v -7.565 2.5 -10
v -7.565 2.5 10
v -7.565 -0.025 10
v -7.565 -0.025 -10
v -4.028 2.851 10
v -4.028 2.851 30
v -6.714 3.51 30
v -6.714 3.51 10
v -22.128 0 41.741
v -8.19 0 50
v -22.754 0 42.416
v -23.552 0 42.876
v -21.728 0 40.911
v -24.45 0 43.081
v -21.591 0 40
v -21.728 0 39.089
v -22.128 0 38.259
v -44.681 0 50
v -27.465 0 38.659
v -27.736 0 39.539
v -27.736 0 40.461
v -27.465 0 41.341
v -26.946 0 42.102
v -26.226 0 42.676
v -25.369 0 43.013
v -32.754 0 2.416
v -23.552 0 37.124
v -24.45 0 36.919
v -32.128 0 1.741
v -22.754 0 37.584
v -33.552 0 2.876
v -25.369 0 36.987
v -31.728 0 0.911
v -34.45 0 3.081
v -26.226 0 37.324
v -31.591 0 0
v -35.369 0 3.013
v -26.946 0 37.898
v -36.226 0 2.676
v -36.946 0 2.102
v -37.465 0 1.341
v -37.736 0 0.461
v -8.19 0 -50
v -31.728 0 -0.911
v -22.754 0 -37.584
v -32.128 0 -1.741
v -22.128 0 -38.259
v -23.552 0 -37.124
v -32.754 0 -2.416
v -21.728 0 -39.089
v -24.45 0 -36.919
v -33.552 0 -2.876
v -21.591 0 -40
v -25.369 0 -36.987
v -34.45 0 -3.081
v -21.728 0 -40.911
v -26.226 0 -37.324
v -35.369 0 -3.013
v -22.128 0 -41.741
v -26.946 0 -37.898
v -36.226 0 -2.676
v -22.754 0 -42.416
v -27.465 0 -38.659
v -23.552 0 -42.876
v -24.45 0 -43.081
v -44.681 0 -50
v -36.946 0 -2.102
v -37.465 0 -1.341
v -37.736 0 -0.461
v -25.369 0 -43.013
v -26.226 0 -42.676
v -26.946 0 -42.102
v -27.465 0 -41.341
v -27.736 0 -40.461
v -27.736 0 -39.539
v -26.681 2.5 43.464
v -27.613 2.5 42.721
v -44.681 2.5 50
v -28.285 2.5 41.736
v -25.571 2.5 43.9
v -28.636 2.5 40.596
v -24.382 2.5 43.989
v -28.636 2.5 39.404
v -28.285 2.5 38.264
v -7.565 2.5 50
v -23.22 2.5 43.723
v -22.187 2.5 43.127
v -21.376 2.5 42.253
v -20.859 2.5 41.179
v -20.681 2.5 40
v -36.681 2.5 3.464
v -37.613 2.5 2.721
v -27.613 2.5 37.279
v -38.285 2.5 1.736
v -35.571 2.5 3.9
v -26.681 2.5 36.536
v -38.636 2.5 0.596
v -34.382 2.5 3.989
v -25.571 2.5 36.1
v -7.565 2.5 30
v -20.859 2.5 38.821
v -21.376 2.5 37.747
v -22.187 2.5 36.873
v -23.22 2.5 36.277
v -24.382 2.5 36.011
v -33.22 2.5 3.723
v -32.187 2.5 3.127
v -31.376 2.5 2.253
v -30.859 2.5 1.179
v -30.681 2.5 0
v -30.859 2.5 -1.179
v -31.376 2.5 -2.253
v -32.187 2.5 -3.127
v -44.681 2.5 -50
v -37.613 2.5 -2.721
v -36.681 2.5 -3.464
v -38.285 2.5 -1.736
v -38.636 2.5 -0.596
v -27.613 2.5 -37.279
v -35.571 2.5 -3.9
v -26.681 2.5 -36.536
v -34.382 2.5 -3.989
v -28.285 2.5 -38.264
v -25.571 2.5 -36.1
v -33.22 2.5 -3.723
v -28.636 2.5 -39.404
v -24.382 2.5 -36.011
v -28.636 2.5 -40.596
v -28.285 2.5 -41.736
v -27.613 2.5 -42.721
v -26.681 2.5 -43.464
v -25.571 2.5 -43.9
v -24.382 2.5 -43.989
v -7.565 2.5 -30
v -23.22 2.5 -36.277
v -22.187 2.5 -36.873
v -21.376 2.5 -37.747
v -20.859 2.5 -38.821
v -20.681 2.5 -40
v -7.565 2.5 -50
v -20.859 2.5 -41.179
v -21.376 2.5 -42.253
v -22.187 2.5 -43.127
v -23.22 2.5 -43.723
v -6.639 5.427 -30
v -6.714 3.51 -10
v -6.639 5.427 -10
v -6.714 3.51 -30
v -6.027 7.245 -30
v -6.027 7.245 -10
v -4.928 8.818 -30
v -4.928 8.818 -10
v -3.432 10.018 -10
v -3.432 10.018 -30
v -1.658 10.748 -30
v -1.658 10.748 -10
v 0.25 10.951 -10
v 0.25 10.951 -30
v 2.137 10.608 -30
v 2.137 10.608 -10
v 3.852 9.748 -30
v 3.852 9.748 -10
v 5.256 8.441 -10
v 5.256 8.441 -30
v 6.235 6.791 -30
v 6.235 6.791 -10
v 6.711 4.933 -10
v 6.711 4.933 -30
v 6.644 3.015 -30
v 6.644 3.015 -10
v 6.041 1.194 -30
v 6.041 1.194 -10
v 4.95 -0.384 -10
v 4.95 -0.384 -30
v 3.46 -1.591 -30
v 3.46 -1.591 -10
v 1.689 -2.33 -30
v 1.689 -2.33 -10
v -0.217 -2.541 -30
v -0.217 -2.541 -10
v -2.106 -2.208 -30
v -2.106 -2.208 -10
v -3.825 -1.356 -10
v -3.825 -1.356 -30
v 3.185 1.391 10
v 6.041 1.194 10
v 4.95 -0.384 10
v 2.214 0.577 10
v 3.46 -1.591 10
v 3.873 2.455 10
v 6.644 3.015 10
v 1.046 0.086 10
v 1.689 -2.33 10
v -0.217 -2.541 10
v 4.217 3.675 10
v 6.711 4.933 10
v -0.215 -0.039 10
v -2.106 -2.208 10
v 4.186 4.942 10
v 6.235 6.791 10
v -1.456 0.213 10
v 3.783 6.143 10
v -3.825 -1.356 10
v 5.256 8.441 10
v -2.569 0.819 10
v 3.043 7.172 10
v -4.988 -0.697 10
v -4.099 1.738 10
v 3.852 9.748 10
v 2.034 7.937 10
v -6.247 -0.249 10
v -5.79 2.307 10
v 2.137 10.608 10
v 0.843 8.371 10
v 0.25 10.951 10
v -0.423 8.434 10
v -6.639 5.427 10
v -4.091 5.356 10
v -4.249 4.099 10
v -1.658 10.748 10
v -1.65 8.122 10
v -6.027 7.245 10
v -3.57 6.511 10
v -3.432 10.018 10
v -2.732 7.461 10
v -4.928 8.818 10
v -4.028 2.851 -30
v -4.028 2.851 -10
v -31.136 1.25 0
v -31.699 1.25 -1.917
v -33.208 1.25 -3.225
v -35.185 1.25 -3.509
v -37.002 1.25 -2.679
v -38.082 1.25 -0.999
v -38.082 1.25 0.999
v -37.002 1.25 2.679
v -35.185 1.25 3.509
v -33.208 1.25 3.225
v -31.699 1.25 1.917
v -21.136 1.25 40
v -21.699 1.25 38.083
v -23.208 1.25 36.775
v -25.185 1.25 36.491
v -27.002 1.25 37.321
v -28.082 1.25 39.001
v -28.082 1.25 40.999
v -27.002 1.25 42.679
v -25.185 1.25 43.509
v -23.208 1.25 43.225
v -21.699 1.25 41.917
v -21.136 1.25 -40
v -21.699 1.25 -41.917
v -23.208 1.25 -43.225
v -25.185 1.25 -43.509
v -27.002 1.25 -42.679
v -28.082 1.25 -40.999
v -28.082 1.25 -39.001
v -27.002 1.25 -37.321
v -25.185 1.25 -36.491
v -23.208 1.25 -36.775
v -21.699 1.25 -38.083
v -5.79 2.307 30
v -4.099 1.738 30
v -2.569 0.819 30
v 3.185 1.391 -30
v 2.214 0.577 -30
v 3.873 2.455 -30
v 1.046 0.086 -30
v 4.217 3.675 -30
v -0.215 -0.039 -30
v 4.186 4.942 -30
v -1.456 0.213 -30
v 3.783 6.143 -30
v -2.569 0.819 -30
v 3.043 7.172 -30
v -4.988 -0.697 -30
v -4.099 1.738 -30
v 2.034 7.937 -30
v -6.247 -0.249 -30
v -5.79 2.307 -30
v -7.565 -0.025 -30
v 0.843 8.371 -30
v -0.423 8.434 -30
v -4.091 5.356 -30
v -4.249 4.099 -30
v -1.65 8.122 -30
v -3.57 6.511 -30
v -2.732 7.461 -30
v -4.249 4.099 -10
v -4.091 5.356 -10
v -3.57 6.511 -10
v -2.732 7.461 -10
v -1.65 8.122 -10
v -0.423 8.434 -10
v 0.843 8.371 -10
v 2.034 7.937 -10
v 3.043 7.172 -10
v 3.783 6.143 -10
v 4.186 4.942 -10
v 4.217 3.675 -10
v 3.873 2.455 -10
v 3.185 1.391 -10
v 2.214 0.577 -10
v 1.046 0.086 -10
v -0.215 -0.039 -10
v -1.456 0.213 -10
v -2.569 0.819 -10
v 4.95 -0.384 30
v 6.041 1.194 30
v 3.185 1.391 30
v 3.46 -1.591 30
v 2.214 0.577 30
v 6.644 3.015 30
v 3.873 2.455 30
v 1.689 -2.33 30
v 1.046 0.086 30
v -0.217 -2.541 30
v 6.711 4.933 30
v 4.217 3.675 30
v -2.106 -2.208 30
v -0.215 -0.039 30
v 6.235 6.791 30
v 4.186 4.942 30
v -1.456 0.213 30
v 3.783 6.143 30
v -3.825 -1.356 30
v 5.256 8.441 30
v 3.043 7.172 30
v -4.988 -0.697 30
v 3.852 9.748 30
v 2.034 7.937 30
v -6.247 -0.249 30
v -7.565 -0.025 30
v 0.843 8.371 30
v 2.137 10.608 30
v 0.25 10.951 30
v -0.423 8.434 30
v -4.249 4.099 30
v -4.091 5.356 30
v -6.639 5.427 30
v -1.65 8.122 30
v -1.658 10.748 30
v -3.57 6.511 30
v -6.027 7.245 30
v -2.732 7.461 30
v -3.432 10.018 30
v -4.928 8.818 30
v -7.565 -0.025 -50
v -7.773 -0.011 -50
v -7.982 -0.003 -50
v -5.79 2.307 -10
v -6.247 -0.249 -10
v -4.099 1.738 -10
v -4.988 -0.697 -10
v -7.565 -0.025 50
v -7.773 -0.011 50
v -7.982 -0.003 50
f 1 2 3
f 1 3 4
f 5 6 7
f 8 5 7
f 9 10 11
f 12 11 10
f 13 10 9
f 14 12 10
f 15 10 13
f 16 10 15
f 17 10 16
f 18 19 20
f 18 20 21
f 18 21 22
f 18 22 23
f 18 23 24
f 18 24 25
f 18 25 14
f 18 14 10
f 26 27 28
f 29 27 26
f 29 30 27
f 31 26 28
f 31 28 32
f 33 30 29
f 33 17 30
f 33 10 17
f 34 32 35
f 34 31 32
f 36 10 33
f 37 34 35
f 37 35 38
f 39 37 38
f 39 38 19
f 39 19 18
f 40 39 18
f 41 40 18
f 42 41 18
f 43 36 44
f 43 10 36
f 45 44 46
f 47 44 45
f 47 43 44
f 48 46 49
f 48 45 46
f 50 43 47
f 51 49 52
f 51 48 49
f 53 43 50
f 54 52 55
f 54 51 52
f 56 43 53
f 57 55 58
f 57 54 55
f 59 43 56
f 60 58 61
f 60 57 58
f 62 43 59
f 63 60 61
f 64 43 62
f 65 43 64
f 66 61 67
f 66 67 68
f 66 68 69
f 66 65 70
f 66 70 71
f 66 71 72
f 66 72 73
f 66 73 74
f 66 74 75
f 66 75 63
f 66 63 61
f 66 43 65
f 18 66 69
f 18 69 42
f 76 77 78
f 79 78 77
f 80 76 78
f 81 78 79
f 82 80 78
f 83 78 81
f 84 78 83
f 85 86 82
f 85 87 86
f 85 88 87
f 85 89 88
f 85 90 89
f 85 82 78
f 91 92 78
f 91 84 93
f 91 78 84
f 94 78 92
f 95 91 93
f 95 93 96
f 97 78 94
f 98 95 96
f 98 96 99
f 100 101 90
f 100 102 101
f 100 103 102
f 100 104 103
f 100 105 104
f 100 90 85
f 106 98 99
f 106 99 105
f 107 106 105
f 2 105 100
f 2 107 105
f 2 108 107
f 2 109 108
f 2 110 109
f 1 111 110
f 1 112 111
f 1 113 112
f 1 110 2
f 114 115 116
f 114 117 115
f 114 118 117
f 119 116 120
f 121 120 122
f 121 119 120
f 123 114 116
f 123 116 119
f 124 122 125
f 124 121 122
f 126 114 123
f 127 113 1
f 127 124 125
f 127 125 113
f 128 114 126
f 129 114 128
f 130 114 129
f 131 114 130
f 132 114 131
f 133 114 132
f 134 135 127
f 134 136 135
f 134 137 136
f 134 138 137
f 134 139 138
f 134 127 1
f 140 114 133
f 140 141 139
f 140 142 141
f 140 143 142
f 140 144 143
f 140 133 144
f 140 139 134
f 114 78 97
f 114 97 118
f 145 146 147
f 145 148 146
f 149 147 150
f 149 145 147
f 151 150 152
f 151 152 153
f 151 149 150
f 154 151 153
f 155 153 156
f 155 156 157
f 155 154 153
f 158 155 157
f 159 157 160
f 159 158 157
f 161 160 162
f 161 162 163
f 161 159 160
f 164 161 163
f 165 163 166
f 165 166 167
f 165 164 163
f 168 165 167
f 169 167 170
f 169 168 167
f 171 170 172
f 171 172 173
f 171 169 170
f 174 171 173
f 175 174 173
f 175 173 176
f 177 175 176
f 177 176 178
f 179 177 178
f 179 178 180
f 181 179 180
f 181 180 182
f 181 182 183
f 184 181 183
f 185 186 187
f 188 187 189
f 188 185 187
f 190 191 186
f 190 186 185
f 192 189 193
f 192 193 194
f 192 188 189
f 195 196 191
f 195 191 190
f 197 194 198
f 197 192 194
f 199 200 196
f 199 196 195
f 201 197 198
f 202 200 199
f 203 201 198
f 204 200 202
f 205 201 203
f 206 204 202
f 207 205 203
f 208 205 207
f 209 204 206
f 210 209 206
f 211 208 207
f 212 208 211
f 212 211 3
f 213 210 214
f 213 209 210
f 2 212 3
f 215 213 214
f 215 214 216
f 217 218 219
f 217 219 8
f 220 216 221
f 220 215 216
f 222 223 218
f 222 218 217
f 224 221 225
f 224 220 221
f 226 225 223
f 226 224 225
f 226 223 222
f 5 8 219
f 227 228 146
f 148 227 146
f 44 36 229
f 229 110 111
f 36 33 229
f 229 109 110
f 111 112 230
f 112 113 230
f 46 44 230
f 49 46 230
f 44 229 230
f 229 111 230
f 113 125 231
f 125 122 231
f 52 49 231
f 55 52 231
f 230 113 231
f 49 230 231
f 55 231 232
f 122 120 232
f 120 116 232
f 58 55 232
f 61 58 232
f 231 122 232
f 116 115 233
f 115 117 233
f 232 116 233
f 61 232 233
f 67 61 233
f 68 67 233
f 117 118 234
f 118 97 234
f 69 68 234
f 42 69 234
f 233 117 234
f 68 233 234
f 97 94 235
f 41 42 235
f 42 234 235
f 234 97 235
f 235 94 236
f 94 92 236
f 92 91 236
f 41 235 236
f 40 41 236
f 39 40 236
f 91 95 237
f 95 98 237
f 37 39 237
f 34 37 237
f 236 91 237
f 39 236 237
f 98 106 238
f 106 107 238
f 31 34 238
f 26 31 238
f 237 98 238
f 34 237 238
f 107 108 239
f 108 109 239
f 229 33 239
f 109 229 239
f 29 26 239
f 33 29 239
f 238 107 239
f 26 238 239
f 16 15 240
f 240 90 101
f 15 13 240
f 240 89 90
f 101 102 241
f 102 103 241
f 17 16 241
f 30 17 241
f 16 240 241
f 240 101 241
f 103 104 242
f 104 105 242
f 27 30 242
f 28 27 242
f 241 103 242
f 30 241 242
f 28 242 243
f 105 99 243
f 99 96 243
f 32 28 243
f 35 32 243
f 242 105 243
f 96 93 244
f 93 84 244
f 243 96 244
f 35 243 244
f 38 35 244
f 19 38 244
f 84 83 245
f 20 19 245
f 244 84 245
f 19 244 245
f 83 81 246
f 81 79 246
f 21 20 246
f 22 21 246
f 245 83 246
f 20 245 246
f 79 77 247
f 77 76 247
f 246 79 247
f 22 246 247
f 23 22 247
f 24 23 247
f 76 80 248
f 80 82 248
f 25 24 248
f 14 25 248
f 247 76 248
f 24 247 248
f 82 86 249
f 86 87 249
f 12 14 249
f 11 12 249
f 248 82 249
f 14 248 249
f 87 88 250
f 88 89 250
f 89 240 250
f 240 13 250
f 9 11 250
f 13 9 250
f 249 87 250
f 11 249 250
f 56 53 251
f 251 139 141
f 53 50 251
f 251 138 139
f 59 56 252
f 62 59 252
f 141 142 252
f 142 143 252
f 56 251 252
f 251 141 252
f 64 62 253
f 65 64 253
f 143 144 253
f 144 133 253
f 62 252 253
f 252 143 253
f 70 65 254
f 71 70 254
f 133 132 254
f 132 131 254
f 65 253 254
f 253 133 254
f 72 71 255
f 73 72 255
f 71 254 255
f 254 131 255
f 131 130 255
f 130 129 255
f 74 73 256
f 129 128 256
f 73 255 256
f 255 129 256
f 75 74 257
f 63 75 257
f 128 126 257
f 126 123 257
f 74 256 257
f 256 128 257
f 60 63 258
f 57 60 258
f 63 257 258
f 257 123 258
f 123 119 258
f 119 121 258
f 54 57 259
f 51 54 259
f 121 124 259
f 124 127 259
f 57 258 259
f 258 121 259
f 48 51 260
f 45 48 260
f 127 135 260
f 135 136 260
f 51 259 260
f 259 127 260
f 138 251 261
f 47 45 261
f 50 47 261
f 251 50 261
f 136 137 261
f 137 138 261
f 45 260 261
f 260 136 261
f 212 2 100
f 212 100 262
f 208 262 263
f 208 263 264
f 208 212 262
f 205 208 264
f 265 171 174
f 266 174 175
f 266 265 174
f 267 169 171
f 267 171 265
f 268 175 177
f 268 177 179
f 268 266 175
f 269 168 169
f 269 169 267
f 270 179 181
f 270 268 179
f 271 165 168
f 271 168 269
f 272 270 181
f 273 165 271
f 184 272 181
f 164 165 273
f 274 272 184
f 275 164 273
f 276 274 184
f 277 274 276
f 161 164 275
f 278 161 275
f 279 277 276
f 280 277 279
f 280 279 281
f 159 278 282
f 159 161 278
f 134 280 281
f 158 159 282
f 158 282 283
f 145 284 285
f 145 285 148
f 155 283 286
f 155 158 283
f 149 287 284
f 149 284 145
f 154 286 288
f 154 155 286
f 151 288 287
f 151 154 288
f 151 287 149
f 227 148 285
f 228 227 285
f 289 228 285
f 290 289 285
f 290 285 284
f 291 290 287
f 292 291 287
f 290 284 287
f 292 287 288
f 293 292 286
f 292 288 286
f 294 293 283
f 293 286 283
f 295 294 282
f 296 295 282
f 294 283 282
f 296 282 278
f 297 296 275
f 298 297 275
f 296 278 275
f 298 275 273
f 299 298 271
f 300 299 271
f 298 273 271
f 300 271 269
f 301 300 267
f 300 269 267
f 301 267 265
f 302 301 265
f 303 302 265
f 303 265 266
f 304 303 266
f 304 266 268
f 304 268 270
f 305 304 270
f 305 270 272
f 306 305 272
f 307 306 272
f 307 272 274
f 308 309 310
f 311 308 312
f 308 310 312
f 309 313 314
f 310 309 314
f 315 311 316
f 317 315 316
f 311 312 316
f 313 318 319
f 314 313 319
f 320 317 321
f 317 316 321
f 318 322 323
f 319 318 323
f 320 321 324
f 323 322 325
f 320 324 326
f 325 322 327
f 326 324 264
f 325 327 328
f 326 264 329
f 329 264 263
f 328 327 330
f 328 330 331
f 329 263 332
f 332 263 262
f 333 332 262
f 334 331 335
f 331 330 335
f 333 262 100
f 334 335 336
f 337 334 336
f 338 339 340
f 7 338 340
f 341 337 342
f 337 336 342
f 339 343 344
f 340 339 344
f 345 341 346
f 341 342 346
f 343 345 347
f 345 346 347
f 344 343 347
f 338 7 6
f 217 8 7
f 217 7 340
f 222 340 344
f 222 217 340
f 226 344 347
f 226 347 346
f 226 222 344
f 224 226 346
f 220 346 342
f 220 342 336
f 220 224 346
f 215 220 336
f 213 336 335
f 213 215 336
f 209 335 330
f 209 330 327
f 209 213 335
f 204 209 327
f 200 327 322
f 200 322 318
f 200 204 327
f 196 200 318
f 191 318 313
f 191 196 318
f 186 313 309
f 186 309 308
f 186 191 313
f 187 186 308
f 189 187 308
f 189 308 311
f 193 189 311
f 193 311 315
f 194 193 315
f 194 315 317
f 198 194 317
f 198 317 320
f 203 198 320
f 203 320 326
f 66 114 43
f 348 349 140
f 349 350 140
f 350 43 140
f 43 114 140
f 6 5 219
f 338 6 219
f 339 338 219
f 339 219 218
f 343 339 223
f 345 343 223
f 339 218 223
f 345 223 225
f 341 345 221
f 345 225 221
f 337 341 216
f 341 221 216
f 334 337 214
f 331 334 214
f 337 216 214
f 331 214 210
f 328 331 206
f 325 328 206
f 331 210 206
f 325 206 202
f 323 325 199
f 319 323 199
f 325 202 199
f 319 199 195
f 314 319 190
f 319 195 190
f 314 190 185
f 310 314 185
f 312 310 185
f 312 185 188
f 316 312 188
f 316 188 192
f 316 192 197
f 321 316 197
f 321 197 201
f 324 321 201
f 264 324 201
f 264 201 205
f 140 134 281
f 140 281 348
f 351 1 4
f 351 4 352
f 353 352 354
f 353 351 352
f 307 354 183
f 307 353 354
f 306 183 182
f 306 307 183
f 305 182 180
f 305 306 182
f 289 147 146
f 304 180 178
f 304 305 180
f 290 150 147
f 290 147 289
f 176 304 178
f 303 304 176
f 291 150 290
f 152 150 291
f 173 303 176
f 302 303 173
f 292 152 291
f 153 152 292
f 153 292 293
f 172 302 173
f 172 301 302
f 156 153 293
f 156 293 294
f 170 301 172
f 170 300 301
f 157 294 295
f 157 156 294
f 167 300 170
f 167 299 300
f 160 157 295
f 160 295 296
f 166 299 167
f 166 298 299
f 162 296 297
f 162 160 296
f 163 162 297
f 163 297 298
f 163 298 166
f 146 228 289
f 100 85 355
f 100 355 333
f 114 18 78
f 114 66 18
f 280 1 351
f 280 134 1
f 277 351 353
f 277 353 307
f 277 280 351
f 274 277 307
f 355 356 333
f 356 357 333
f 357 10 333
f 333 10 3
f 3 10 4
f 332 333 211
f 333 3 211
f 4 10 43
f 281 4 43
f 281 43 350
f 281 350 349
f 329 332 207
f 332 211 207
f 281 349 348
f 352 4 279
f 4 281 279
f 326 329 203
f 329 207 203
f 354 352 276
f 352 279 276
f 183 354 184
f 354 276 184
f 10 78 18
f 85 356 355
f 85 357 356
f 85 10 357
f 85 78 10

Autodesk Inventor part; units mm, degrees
ref_plane "YZ Plane" through (0, 0, 0) normal (1, 0, 0) x (0, 1, 0)
ref_plane "XZ Plane" through (0, 0, 0) normal (0, 1, 0) x (-1, 0, 0)
ref_plane "XY Plane" through (0, 0, 0) normal (0, 0, 1) x (1, 0, 0)
sketch "Sketch1" plane through (0, 0, 0) normal (0, 0, 1) x (1, 0, 0)
  line L0 (-44.6809, 2.5) -> (-7.5647, 2.5)
  line L1 (-44.6809, 0) -> (-44.6809, 2.5)
  line L2 (0, 0) -> (0, 19.2246)
  arc A0 (-3.8253, -1.3563) -> (-6.7141, 3.5099) centre (0, 4.2052) ccw
  arc A1 (-2.5687, 0.8193) -> (-4.0285, 2.8511) centre (0, 4.2052) ccw
  arc A2 (-2.5687, 0.8193) -> (-7.5647, 2.5) centre (-7.5647, -5.7659) ccw
  line L3 (-4.0285, 2.8511) -> (-6.7141, 3.5099)
  arc A3 (-3.8253, -1.3563) -> (-8.1904, 0) centre (-8.1904, -7.7027) ccw
  line L4 (-8.1904, 0) -> (-44.6809, 0)
  line L5 (-36.0171, 0) -> (-5.5909, 0)
  line L6 (-5.2801, 0) -> (0, 0)
  point P0 (0, 10.9552)
  point P1 (0, 8.4552)
  dimension "d1" = 2.5
  dimension "d2" = 2.5
  dimension "d3" = 8.5
extrude "Extrusion1" add sketch "Sketch1" along normal mid plane 100 contours L0 A2 A1 L2 A0 A3 L4 L1 | A1 L3 A0 L2
sketch "Sketch2" plane through (-44.6809, 2.5, 50) normal (0, 1, 0) x (1, 0, 0)
  circle A0 centre (20, 90) radius 4
  circle A1 centre (10, 50) radius 4
  circle A2 centre (20, 10) radius 4
  line L0 (0, 100) -> (37.1161, 100) projected
  line L1 (0, 100) -> (0, 0) projected
  line L2 (37.1161, 0) -> (0, 0) projected
  point P0 (44.6809, 50)
  dimension "d6" = 8
  dimension "d7" = 8
  dimension "d8" = 8
  dimension "d9" = 10
  dimension "d10" = 20
  dimension "d11" = 20
  dimension "d12" = 10
  dimension "d13" = 10
  dimension "d14" = 50
extrude "Extrusion2" cut sketch "Sketch2" against normal up to next draft -20
sketch "Sketch3" plane through (-44.6809, 2.5, 50) normal (0, 1, 0) x (1, 0, 0)
  line L0 (37.1161, 0) -> (37.1161, 100) projected
  line L1 (37.1161, 100) -> (67.1161, 100)
  line L2 (67.1161, 100) -> (67.1161, 80)
  line L3 (67.1161, 80) -> (37.1161, 80)
  line L4 (37.1161, 80) -> (37.1161, 100)
  line L5 (37.1161, 60) -> (67.1161, 60)
  line L6 (67.1161, 60) -> (67.1161, 40)
  line L7 (67.1161, 40) -> (37.1161, 40)
  line L8 (37.1161, 40) -> (37.1161, 60)
  line L9 (37.1161, 0) -> (0, 0) projected
  line L10 (37.1161, 0) -> (70.6977, 0)
  line L11 (70.6977, 0) -> (70.6977, 20)
  line L12 (70.6977, 20) -> (37.1161, 20)
  line L13 (37.1161, 20) -> (37.1161, 0)
  point P0 (44.6809, 50)
  point P1 (37.1161, 20)
  dimension "d17" = 20
  dimension "d18" = 30
  dimension "d19" = 20
  dimension "d20" = 20
  dimension "d21" = 20
extrude "Extrusion3" cut sketch "Sketch3" against normal mid plane 100
properties part number "Hinge1" material "Stainless Steel"
